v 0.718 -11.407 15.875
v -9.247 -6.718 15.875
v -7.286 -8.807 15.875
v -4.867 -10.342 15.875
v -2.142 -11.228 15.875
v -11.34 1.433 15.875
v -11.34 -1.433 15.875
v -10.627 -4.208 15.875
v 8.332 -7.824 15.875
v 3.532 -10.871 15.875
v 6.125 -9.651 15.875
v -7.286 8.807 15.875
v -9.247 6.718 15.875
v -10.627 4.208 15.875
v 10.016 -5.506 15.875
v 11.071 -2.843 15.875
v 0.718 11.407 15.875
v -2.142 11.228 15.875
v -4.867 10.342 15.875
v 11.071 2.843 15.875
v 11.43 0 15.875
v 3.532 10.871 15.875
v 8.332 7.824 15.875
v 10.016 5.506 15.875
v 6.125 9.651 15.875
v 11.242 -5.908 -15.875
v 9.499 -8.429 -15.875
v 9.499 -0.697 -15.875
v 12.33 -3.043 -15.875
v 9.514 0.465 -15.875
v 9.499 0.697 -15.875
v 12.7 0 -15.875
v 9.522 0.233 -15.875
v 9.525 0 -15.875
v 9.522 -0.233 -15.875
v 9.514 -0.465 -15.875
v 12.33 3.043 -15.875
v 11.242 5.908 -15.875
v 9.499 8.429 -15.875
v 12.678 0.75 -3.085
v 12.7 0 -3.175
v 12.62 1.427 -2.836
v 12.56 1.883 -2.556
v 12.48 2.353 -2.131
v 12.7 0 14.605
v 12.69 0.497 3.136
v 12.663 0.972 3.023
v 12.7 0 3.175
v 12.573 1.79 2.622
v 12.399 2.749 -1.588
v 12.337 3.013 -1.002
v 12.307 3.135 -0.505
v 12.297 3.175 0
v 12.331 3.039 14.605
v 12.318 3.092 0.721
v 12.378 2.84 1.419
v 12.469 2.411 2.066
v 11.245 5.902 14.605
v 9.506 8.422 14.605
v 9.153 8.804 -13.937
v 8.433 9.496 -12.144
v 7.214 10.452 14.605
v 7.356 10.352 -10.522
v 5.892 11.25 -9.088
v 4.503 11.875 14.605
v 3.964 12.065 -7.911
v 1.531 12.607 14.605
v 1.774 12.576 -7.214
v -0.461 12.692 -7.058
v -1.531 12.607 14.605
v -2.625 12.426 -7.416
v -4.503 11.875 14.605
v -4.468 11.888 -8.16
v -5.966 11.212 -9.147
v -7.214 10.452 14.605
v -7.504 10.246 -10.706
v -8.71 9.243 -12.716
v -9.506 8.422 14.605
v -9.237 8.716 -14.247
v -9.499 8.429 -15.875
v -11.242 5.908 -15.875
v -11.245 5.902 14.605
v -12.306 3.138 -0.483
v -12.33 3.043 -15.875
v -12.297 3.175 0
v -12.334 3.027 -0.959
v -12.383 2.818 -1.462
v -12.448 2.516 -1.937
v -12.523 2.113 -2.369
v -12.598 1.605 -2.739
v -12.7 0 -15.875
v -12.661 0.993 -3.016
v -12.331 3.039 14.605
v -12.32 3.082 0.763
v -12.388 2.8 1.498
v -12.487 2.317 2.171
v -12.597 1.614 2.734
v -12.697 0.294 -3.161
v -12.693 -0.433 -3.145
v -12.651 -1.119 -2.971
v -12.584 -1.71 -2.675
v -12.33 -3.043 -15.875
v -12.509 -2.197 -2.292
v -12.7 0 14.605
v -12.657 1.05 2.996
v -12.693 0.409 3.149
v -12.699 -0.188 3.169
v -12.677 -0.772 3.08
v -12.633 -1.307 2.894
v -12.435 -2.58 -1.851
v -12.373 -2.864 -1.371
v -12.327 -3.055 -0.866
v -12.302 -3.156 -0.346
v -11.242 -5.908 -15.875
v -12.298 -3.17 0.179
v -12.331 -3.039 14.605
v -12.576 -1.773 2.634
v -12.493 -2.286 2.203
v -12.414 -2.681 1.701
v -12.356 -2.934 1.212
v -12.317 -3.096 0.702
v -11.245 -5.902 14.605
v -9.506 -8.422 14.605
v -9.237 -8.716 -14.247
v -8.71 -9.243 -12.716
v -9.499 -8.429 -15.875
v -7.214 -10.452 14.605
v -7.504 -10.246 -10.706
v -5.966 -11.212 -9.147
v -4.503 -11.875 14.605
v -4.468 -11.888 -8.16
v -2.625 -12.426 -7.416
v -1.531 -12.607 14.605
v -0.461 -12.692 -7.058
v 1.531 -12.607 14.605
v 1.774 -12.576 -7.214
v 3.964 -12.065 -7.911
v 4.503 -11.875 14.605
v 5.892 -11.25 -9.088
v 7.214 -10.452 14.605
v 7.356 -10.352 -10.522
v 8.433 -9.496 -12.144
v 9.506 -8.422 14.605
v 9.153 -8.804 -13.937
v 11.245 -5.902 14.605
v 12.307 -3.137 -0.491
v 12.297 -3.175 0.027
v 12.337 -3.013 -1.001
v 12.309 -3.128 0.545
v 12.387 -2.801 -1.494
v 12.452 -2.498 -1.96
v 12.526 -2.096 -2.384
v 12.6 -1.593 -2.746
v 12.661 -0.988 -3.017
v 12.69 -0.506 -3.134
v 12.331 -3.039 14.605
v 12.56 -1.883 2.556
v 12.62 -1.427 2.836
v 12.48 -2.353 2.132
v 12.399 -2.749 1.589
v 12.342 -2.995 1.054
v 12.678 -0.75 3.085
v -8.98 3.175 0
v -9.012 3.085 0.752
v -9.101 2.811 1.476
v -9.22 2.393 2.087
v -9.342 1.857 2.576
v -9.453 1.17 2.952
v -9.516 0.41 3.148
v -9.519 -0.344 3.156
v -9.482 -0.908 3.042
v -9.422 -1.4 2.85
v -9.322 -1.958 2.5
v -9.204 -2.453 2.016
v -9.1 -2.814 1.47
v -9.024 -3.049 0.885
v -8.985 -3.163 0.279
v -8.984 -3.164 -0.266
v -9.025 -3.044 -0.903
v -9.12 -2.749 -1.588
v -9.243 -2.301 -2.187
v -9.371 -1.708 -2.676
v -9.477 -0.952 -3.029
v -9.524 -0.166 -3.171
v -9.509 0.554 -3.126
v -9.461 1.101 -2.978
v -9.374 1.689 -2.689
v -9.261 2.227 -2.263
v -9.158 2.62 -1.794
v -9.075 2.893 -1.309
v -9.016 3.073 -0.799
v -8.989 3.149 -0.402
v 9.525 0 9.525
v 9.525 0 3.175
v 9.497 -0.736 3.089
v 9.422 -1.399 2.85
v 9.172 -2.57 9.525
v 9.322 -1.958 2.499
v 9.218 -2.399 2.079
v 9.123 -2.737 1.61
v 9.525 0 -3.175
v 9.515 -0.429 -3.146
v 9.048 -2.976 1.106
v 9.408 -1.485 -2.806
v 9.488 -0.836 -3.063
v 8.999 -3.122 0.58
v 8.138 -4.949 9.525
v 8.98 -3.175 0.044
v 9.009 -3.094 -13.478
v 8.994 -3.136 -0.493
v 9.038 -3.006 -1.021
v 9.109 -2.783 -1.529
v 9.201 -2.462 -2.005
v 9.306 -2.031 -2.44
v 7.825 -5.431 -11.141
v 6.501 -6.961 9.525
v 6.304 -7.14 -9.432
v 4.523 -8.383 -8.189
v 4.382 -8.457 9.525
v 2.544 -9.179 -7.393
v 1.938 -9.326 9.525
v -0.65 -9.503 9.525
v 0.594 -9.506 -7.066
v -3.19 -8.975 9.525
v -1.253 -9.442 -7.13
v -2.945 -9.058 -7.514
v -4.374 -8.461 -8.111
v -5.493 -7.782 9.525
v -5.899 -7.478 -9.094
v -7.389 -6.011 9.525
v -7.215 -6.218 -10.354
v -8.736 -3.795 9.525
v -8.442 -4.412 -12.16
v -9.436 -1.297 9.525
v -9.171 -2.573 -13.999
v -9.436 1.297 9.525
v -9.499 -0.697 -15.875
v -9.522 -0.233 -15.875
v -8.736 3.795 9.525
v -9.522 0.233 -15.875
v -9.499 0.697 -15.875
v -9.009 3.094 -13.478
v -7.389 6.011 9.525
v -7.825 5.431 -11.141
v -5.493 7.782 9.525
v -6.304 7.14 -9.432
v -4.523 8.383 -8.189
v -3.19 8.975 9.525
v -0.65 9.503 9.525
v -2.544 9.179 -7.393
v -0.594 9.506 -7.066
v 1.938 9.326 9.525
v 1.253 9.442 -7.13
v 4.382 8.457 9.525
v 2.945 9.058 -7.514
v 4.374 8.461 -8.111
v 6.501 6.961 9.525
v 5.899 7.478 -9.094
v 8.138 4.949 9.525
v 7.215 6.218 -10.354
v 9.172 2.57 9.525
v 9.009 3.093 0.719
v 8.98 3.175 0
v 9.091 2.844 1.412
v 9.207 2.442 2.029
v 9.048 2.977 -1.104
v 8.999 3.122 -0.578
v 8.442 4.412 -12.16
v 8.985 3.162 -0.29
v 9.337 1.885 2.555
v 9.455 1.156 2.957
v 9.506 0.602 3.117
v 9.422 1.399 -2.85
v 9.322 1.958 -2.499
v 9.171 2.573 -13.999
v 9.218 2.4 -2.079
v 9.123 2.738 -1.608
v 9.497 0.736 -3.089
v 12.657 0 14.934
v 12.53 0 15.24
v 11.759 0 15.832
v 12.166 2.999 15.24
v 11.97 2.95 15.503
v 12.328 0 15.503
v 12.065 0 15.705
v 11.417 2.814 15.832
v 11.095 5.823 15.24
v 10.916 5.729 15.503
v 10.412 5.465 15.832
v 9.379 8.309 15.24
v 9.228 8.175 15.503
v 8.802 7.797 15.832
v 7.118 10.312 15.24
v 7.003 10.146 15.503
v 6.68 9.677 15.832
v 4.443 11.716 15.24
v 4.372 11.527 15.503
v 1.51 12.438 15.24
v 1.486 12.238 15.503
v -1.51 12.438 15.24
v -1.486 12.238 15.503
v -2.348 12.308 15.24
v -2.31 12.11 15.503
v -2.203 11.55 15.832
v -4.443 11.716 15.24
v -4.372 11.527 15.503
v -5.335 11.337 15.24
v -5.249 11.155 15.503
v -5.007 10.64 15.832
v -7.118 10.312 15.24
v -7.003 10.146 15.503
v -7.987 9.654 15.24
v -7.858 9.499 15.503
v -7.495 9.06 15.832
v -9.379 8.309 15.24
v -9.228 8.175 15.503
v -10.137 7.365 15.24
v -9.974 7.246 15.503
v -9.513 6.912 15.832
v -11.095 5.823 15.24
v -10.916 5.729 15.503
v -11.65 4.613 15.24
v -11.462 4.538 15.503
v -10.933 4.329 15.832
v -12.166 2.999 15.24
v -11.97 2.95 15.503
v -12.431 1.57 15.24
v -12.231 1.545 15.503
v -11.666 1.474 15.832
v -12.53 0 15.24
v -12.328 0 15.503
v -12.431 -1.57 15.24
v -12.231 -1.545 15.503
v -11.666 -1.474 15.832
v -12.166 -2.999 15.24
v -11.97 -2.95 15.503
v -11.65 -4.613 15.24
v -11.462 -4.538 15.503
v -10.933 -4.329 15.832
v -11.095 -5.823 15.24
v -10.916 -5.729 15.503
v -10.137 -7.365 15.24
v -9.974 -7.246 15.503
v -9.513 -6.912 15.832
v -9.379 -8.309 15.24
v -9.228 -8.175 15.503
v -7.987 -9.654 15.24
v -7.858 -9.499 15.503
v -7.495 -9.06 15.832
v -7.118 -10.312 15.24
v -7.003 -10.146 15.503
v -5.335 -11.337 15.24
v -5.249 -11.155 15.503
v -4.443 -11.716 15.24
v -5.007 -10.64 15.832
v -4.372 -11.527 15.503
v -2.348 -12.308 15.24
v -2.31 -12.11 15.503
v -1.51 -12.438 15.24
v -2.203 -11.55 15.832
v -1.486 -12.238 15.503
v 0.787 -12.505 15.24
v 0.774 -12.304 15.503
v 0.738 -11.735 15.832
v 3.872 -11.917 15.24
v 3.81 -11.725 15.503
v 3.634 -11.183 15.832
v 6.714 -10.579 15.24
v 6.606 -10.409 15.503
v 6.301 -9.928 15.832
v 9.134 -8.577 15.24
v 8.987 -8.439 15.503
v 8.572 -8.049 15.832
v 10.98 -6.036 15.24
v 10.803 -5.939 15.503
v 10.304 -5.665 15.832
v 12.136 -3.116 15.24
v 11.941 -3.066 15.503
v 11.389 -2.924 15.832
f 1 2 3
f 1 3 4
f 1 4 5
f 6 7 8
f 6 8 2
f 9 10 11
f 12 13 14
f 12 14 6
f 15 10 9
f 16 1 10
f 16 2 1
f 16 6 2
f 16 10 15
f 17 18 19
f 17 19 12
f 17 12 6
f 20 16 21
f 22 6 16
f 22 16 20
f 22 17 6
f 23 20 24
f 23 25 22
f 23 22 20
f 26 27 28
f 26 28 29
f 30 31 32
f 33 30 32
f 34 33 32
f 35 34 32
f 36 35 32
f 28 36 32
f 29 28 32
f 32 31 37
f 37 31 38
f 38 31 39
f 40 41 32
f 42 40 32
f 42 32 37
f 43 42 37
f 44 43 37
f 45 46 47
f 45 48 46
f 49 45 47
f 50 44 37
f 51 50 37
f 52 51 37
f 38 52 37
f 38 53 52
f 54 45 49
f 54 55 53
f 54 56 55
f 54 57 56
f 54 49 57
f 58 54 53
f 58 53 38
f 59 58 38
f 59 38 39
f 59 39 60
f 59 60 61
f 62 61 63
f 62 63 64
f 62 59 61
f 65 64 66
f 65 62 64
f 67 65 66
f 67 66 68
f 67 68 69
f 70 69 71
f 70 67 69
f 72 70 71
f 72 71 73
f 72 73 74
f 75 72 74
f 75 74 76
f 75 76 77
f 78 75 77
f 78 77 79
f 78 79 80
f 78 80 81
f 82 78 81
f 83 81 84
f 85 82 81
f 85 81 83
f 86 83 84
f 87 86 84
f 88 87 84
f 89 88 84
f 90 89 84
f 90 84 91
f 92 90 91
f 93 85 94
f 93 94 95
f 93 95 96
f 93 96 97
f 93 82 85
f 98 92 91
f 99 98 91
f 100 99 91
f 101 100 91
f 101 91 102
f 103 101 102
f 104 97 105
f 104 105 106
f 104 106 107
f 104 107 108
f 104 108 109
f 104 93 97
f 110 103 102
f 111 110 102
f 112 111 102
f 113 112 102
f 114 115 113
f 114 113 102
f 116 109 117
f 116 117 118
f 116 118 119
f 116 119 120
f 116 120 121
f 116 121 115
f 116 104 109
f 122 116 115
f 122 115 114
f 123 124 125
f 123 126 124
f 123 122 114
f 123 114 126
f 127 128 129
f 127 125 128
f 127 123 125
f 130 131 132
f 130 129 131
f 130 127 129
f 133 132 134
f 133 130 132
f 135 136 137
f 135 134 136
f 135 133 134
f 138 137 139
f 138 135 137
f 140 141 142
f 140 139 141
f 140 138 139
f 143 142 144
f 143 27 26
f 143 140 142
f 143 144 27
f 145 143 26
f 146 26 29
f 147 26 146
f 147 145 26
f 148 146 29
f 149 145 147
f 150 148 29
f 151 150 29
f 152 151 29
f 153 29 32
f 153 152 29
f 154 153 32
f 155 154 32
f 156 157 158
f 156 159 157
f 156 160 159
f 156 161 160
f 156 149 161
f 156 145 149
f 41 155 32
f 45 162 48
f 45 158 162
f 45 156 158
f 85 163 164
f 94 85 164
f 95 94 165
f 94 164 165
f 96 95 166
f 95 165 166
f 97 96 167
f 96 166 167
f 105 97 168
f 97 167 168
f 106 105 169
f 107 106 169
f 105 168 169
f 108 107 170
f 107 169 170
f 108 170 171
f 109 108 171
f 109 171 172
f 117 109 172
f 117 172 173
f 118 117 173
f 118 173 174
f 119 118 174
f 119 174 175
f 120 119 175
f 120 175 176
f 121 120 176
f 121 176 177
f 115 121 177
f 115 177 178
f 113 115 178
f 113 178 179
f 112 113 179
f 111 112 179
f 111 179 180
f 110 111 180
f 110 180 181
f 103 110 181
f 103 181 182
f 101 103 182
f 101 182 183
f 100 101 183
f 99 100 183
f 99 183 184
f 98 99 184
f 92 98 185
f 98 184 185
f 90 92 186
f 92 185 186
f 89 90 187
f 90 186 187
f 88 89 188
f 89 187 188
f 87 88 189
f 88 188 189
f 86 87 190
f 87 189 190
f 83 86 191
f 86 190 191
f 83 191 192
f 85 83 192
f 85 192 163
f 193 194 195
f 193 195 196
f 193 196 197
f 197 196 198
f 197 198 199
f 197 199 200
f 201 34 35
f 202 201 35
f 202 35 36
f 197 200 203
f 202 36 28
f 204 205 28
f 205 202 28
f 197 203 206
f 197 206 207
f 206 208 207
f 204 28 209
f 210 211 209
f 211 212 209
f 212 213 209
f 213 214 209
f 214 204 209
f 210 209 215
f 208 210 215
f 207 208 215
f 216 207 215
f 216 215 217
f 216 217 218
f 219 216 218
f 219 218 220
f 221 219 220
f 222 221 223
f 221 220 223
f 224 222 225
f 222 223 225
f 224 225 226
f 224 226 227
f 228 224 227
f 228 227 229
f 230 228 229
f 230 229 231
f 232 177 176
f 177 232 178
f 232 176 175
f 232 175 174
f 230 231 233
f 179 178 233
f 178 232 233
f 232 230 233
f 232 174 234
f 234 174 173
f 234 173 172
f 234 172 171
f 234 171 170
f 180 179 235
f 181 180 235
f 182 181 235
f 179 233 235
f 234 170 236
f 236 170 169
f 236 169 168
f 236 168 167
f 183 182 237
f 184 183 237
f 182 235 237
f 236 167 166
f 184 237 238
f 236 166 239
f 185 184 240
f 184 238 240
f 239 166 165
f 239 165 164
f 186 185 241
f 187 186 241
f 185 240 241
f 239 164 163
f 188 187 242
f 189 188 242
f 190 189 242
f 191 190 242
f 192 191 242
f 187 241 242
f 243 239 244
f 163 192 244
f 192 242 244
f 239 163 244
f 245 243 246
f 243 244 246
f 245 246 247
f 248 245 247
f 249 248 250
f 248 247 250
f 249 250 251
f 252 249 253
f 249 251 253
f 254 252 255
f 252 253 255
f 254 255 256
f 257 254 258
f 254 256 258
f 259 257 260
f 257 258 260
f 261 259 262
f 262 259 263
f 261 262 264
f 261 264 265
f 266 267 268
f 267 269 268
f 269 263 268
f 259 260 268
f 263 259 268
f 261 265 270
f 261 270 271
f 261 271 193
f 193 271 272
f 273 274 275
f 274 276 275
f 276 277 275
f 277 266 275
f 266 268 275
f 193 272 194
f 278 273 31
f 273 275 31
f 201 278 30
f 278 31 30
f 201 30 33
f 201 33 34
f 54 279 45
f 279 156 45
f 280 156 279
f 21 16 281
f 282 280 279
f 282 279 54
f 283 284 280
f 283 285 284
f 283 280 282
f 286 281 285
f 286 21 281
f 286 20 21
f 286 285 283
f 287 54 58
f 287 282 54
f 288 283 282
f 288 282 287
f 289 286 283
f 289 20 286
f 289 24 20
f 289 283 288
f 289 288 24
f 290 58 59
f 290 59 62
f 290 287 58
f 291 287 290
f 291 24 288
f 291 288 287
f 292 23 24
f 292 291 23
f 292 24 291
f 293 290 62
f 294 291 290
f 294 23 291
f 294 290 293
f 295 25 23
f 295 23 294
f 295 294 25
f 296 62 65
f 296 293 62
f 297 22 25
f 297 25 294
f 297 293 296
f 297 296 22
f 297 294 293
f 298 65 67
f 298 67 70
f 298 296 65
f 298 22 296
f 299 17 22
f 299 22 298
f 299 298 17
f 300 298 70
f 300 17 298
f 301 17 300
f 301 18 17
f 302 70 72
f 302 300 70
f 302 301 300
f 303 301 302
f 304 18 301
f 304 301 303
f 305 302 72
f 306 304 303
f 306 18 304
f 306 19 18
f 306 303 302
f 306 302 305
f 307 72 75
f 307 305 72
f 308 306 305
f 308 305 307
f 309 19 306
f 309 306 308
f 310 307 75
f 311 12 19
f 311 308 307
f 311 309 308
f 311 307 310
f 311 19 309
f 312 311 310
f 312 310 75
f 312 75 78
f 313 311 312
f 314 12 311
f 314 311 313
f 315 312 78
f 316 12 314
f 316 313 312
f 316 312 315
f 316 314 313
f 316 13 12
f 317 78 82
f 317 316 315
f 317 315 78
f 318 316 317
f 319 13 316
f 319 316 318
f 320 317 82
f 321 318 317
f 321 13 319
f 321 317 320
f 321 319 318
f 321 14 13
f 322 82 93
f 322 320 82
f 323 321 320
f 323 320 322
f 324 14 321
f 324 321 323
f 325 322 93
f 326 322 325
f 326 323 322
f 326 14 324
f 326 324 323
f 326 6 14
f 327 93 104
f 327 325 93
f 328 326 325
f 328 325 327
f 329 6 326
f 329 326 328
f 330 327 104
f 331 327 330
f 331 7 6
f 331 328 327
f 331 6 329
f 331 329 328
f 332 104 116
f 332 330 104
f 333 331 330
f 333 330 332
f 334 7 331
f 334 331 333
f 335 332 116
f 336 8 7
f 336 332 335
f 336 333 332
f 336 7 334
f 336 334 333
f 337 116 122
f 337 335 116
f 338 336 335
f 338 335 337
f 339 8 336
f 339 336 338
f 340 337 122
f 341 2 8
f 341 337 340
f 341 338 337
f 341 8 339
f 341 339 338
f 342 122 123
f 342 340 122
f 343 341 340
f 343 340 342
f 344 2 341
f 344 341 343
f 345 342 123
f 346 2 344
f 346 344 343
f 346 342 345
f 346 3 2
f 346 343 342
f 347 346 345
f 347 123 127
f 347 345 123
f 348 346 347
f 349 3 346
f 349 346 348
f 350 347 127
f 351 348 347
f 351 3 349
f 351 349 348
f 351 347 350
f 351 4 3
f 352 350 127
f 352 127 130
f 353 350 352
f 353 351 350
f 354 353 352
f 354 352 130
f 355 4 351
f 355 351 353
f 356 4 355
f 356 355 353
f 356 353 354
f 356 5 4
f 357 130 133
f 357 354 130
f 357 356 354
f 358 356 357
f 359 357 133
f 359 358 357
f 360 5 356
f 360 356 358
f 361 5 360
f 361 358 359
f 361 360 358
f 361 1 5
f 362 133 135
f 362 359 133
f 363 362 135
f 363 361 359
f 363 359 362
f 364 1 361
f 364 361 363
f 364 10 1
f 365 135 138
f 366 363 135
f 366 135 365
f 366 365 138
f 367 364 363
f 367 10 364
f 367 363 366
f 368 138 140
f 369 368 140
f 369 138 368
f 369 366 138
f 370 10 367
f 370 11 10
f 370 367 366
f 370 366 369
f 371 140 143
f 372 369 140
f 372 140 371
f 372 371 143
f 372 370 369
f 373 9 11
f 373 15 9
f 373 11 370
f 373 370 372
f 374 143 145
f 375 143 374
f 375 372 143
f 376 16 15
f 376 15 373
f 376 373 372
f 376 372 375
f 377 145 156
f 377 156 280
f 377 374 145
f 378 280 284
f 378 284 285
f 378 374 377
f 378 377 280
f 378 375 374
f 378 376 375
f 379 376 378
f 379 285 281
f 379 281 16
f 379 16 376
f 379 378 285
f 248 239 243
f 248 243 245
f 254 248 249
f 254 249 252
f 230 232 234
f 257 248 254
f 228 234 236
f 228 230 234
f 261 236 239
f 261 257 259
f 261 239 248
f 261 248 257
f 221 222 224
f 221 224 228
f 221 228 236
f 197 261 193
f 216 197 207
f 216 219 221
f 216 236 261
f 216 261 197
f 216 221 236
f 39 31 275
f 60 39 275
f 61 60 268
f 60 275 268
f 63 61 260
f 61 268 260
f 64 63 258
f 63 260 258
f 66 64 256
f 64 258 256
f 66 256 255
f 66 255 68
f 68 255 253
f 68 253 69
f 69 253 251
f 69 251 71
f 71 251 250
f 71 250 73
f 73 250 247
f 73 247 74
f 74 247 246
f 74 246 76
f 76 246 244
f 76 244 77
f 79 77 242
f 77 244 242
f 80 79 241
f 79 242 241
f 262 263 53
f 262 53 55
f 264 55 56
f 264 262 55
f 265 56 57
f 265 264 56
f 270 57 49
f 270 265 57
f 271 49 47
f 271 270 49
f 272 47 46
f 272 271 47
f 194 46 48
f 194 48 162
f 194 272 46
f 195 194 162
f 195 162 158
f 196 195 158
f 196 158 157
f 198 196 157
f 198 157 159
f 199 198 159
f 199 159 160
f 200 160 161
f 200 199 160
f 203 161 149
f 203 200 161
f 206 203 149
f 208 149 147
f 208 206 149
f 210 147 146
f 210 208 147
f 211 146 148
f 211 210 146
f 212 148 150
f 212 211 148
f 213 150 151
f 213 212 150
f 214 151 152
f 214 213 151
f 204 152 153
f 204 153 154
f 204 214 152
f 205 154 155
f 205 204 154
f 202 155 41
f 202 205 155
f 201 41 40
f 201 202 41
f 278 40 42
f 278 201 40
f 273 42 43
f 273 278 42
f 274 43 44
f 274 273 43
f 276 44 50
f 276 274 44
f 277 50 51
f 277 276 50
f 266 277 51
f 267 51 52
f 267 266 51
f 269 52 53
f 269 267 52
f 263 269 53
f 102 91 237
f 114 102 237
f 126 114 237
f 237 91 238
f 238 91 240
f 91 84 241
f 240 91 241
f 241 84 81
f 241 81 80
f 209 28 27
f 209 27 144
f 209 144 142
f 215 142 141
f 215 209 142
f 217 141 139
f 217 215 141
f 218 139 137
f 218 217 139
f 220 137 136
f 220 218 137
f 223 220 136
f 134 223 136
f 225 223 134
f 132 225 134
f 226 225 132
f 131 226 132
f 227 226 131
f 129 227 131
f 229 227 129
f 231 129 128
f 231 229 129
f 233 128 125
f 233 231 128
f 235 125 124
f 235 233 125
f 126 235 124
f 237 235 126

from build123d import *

# Parameters (mm, degrees)
F0_R          = 12.7
F1_DEPTH      = 15.875
F1_DEPTH_BACK = 15.875
F2_R          = 9.525
F3_DEPTH      = 25.4
F4_R          = 1.27
F6_DEPTH      = 25.4
F6_DEPTH_BACK = 25.4
F7_R          = 3.175
F8_DEPTH      = 12.7
F8_DEPTH_BACK = 12.7


with BuildPart() as f1:
    # F0 (on Top) → F1 (new body, two sides)
    with BuildSketch(Plane.XY) as f1_sk:
        Circle(F0_R)
    extrude(amount=F1_DEPTH)
    extrude(f1_sk.sketch, amount=-F1_DEPTH_BACK)

    # F2 (on face) → F3 (cut)
    with BuildSketch(Plane(origin=(0, 0, -15.875), x_dir=(1, 0, 0), z_dir=(0, 0, -1))):
        Circle(F2_R)
    extrude(amount=-F3_DEPTH, mode=Mode.SUBTRACT)

    # F4
    f4_edges = [f1.edges().sort_by_distance(p)[0] for p in [
        (-12.7, 0, 15.875),
    ]]
    fillet(f4_edges, radius=F4_R)

    # F5 (on Front) → F6 (cut, two sides)
    with BuildSketch(Plane.XZ) as f6_sk:
        with BuildLine():
            ThreePointArc((0, -7.0470880032), (-6.7351920908, -23.307280094), (9.525, -16.5720880032))
            ThreePointArc((9.525, -16.5720880032), (6.7351920908, -9.8368959124), (0, -7.0470880032))
        make_face()
    extrude(amount=F6_DEPTH, mode=Mode.SUBTRACT)
    extrude(f6_sk.sketch, amount=-F6_DEPTH_BACK, mode=Mode.SUBTRACT)

    # F7 (on Right) → F8 (cut, two sides)
    with BuildSketch(Plane.YZ) as f8_sk:
        Circle(F7_R)
    extrude(amount=-F8_DEPTH, mode=Mode.SUBTRACT)
    extrude(f8_sk.sketch, amount=F8_DEPTH_BACK, mode=Mode.SUBTRACT)


solid = f1.part
